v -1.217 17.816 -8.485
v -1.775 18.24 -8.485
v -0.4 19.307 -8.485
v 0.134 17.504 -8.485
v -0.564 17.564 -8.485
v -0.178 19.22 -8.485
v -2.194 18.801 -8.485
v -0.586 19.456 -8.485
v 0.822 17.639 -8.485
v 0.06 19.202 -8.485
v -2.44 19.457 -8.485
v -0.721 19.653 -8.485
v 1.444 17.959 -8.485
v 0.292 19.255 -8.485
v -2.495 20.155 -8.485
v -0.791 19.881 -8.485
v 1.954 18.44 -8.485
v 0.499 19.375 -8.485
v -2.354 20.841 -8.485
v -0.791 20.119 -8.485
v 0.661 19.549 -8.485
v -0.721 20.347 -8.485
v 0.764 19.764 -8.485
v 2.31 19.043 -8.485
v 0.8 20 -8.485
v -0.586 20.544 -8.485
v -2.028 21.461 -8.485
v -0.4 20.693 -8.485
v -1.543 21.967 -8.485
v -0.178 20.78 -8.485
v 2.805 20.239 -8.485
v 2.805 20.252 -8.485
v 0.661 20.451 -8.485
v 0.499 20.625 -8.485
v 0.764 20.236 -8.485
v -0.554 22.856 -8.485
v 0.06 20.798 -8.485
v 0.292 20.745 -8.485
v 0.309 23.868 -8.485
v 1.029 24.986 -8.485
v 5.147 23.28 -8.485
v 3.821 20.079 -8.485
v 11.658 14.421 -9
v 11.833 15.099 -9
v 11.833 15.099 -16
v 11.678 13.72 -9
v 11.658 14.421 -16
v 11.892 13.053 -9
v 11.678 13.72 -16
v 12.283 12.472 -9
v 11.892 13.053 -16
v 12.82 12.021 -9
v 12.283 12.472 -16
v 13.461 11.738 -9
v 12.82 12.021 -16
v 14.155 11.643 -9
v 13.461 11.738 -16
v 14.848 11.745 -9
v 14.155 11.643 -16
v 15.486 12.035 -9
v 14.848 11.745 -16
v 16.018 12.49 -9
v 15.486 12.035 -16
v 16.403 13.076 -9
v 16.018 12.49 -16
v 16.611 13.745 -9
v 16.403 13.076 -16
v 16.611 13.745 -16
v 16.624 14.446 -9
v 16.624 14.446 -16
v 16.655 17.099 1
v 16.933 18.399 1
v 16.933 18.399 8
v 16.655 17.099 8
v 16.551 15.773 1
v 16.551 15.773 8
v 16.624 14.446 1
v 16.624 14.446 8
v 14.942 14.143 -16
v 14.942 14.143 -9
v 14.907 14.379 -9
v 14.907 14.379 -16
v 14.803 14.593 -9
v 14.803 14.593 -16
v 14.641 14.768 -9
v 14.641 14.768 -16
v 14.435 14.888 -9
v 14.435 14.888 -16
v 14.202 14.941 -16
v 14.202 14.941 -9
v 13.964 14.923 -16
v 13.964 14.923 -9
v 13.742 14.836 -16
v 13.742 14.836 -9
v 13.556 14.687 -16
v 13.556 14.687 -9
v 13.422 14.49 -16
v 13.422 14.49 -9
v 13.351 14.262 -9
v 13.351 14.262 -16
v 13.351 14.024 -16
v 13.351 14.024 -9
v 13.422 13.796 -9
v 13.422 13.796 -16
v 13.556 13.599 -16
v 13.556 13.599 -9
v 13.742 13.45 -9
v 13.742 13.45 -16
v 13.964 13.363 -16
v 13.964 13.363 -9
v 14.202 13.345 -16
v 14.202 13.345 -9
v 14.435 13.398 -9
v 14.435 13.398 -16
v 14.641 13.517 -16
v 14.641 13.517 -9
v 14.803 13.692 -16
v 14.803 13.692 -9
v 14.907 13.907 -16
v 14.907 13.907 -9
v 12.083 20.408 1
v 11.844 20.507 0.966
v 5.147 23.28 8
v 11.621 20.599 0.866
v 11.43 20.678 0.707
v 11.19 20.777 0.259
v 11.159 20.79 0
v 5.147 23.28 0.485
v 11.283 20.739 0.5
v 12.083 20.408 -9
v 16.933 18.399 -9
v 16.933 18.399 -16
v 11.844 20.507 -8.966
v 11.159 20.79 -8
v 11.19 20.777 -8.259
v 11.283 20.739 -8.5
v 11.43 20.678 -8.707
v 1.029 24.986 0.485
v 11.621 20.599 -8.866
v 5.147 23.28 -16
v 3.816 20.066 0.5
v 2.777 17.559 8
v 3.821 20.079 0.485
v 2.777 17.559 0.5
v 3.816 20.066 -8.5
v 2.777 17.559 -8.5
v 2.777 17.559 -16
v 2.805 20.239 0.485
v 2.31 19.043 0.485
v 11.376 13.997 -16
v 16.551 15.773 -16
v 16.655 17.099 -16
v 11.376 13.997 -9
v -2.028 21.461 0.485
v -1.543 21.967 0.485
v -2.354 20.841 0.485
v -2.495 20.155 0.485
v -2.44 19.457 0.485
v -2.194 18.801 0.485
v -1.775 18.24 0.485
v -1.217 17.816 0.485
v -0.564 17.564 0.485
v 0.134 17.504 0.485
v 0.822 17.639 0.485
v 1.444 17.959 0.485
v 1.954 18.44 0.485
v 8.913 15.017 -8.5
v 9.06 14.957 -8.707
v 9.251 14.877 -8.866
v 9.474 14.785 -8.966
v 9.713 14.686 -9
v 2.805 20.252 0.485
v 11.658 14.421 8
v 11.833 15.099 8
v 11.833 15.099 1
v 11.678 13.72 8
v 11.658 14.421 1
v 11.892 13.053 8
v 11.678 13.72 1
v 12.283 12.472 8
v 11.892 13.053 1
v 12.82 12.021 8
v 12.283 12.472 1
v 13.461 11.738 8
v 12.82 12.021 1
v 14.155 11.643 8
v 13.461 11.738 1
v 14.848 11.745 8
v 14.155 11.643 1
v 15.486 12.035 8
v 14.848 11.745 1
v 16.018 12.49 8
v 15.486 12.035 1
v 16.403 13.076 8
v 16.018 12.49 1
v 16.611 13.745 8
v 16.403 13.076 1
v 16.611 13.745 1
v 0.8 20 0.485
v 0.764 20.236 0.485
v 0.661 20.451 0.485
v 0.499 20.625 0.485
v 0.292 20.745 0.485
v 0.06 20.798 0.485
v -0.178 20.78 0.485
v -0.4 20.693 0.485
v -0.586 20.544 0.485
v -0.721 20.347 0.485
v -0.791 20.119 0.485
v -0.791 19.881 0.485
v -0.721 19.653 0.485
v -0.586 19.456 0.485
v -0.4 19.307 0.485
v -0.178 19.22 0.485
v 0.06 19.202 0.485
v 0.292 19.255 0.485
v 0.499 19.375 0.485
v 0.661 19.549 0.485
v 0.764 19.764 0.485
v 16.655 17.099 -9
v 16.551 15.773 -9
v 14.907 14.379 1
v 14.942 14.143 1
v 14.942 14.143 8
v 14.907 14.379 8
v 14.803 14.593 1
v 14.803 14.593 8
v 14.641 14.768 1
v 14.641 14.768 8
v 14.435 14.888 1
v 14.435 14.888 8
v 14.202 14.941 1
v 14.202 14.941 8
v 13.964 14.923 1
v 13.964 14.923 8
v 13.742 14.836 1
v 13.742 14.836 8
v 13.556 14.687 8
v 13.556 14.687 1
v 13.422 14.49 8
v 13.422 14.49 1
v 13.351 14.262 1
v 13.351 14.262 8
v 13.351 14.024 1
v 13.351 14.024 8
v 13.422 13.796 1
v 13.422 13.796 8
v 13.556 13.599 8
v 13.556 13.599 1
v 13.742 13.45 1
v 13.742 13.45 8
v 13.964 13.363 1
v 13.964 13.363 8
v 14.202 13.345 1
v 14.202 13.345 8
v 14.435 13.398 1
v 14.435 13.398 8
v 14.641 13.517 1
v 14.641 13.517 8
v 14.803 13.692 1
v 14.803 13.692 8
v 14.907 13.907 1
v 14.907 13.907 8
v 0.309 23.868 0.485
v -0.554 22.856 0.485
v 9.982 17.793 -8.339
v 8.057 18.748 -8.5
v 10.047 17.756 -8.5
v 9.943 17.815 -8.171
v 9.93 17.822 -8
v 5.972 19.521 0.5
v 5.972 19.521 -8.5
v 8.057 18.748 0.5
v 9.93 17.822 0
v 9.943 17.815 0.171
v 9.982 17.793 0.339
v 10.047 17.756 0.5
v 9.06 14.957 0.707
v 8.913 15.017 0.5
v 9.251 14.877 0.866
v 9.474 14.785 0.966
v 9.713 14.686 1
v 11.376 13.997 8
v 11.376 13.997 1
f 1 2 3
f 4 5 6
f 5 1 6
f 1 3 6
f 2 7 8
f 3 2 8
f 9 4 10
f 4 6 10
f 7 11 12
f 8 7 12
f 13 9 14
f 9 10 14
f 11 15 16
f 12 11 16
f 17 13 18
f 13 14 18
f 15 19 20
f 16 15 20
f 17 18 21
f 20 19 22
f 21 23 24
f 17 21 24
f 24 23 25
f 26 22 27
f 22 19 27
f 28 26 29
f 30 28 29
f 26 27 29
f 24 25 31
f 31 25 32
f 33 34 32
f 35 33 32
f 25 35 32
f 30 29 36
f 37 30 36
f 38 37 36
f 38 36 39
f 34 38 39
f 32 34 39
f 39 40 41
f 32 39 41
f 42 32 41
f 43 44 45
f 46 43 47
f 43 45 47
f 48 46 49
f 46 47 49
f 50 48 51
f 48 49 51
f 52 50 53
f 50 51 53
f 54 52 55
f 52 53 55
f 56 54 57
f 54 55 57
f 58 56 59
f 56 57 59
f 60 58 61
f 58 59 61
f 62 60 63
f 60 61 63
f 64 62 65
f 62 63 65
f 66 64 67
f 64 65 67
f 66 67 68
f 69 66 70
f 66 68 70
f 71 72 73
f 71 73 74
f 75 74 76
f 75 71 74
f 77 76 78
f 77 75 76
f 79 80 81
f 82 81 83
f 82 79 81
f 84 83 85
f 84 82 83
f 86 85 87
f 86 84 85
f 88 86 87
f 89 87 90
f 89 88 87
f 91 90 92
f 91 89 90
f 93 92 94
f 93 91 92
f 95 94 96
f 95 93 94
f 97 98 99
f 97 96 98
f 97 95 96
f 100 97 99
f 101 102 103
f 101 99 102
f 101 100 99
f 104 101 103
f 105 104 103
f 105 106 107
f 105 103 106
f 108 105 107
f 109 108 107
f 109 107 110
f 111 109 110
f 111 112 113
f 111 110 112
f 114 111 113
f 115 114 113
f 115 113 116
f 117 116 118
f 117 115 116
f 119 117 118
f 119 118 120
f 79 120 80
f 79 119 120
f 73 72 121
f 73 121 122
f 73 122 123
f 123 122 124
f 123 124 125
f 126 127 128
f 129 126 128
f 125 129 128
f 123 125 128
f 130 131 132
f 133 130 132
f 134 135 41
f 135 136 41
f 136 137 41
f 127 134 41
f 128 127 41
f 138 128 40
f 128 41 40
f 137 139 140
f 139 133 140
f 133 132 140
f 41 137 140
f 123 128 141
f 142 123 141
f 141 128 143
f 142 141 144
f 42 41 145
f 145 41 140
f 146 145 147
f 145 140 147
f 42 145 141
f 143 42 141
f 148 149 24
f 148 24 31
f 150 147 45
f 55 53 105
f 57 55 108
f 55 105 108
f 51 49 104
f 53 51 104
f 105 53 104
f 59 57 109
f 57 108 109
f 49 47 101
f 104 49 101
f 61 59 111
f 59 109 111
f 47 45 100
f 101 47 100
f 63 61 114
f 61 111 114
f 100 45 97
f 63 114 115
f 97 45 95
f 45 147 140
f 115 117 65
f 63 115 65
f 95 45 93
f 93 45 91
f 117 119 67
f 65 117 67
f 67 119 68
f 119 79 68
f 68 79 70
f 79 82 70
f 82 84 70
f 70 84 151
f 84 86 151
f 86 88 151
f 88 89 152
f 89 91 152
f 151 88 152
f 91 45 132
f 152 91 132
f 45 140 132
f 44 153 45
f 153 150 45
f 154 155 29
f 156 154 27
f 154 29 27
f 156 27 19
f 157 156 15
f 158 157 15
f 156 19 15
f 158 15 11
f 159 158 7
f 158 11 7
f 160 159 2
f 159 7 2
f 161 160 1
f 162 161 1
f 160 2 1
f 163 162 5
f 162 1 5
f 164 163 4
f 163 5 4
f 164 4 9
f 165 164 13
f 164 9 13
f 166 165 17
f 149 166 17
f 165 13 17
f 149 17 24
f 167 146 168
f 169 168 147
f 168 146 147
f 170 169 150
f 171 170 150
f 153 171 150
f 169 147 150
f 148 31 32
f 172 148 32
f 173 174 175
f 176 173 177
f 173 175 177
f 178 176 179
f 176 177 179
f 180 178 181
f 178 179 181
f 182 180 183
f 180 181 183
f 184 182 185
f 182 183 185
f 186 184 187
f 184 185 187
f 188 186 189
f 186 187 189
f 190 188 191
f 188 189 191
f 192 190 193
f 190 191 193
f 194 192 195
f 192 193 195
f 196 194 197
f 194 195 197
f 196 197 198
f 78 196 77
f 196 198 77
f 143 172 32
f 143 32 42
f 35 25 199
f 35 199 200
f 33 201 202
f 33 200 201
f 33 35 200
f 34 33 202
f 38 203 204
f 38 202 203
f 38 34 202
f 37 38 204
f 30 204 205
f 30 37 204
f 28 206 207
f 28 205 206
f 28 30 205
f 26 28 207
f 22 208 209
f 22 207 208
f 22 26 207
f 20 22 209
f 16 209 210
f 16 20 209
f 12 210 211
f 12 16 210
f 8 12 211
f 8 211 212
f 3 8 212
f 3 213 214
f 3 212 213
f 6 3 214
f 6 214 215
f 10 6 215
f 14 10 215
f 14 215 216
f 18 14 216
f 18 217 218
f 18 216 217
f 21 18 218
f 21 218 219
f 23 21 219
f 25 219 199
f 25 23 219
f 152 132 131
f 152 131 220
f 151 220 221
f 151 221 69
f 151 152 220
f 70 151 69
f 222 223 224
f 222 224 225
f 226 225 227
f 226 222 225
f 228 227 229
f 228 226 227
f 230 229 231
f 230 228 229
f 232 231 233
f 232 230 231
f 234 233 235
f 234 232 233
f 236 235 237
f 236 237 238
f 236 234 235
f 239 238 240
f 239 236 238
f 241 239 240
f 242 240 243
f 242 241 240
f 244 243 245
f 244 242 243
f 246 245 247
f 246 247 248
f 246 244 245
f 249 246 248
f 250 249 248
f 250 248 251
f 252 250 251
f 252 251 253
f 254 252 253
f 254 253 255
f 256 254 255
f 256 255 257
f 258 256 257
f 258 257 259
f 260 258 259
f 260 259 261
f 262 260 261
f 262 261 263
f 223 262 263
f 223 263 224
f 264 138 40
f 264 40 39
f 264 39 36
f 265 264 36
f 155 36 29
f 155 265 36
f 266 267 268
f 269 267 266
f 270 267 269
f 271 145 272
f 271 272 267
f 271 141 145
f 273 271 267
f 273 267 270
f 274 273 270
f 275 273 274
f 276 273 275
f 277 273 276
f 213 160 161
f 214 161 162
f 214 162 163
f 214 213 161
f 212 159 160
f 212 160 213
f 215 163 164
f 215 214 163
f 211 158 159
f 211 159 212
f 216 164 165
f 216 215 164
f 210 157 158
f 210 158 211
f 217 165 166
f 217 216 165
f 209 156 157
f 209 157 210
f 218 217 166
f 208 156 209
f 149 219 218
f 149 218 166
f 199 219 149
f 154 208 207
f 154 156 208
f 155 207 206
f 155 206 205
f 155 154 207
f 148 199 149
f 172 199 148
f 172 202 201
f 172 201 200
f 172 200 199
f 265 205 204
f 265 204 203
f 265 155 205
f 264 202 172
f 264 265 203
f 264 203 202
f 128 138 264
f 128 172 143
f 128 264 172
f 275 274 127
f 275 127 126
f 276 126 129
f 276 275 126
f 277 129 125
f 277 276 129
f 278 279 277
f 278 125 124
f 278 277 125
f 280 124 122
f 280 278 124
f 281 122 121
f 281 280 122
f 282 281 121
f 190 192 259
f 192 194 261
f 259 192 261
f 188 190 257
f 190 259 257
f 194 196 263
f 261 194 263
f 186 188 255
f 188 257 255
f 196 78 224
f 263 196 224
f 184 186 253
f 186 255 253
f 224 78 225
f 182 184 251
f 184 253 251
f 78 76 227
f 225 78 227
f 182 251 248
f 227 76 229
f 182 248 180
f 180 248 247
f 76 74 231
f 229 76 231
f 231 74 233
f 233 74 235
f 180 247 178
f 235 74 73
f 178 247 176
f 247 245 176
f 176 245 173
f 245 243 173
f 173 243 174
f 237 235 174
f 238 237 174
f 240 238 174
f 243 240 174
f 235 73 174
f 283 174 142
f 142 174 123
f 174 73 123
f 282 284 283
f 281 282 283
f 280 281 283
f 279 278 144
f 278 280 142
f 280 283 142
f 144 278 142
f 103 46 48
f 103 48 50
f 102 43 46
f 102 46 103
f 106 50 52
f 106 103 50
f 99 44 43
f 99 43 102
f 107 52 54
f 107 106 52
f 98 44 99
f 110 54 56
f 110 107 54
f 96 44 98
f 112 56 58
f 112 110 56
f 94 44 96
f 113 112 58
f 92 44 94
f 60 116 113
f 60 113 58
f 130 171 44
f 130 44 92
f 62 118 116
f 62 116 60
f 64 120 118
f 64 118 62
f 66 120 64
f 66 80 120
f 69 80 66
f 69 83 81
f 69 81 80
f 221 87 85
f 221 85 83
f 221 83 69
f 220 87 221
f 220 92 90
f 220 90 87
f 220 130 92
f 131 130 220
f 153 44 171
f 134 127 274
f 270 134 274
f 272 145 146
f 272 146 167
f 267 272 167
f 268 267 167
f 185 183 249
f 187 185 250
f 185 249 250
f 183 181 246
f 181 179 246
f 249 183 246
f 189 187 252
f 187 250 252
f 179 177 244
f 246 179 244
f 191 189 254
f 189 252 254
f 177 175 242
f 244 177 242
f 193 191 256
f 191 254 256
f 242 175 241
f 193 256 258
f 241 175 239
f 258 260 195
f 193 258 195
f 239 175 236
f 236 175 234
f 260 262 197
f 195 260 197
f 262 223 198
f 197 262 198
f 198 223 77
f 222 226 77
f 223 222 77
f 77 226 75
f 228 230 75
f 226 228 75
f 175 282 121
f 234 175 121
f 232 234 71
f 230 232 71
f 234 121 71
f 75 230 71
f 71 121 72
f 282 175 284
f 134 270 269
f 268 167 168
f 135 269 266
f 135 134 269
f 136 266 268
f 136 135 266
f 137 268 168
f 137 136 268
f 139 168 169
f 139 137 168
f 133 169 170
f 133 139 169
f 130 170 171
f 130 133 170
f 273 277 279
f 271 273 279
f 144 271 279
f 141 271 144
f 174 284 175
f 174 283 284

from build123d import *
from OCP.BRepAlgoAPI import BRepAlgoAPI_Cut
from OCP.TopTools import TopTools_ListOfShape

# Parameters (mm, degrees)
SALIENTE_EXTRUIR1_DEPTH      = 8
SALIENTE_EXTRUIR1_DEPTH_BACK = 16
CROQUIS1_R                   = 0.8000000000000019
CROQUIS1_R_2                 = 0.8000000000000002
CROQUIS3_W                   = 5.999999999999999
CROQUIS3_H                   = 7.5149398575439825
CORTAR_EXTRUIR1_DEPTH        = 16
CROQUIS4_W                   = 12.500000000000004
CROQUIS4_H                   = 10.000000000000002
CORTAR_EXTRUIR2_DEPTH        = 16
REDONDEO1_R                  = 10
CORTAR_EXTRUIR3_DEPTH        = 39.561831595033986
SALIENTE_EXTRUIR2_START      = -7
SALIENTE_EXTRUIR2_DEPTH      = 7
SALIENTE_EXTRUIR3_START      = -7
SALIENTE_EXTRUIR3_DEPTH      = 7
CORTAR_EXTRUIR4_DEPTH        = 39.561831595033986
SALIENTE_EXTRUIR4_START      = 0.5
SALIENTE_EXTRUIR4_DEPTH      = 0.5
SALIENTE_EXTRUIR5_DEPTH      = 0.5
REDONDEO2_R                  = 1
SALIENTE_EXTRUIR6_DEPTH      = 7.5
SALIENTE_EXTRUIR7_DEPTH      = 7.5
CORTAR_EXTRUIR5_DEPTH        = 6.192871


with BuildPart() as part:
    # Croquis1 → Saliente-Extruir1 (new, two sides: drawn at the far end of the back side and taken through both)
    with BuildSketch(Plane.XY.offset(-SALIENTE_EXTRUIR1_DEPTH_BACK)):
        with BuildLine():
            Line((2.309746663820058, 19.04340690522453), (11.832681853129706, 15.099435825287522))
            ThreePointArc((11.832681853129735, 15.099435825287586), (14.633813116183077, 11.69161014757831), (15.904999780297969, 15.915790146996653))
            Line((15.904999780297969, 15.915790146996654), (16.93335681353175, 18.398814789031395))
            Line((16.93335681353175, 18.398814789031395), (1.029391105834504, 24.985521467228967))
            Line((1.029391105834504, 24.985521467228967), (0, 22.5))
            ThreePointArc((-2.2e-16, 22.5), (-2.078639306967261, 18.611022451034337), (2.3097466638200577, 19.04340690522453))
        make_face()
        with Locations((14.142428516949789, 14.142842730512115)):
            Circle(CROQUIS1_R, mode=Mode.SUBTRACT)
        with Locations((-8e-16, 20)):
            Circle(CROQUIS1_R_2, mode=Mode.SUBTRACT)
    extrude(amount=SALIENTE_EXTRUIR1_DEPTH + SALIENTE_EXTRUIR1_DEPTH_BACK)

    # Croquis3 → Cortar-Extruir1 (cut)
    with BuildSketch(Plane(origin=(8.98354685928157, 21.691268210929703, 0), x_dir=(0.9238986655280315, -0.38263723791016835, 0), z_dir=(0.38263723791016835, 0.9238986655280315, 0))):
        Polygon((-10.15274475820337, -8), (-4.152744758203371, -8), (-4.152744758203371, -0.4850601424560169), (-10.15274475820337, -0.48506014245601775), align=None)
        with Locations((-7.1527447582033705, 12.242530071228009)):
            Rectangle(CROQUIS3_W, CROQUIS3_H)
    extrude(amount=-CORTAR_EXTRUIR1_DEPTH, mode=Mode.SUBTRACT)

    # Croquis4 → Cortar-Extruir2 (cut)
    with BuildSketch(Plane(origin=(8.98354685928157, 21.691268210929703, 0), x_dir=(0.9238986655280315, -0.38263723791016835, 0), z_dir=(0.38263723791016835, 0.9238986655280315, 0))):
        with Locations((8.604634091236255, 4.000000000000001)):
            Rectangle(CROQUIS4_W, CROQUIS4_H)
    extrude(amount=-CORTAR_EXTRUIR2_DEPTH, mode=Mode.SUBTRACT)

    # Redondeo1
    # the kernel refuses this fillet: 10 mm, written as the material it adds along each edge
    with BuildSketch(Plane(origin=(15.90499978029797, 15.915790146996653, 1), x_dir=(0.43937810664982085, -0.898302220523148, 0), z_dir=(0, 0, 1))) as redondeo1_piece_1:
        with BuildLine():
            CenterArc((4.909244259441116, 9.449263834962537), REDONDEO1_R, 228.0261529616087, 22.86990266701423)
            Line((-1.7786689833312208, 2.0147620724265707), (-1.9124272481866686, 1.8660720371758521))
            ThreePointArc((-1.9124272481866686, 1.8660720371758521), (-1.0392674370387214, 0.8750174766821813), (-0.14993294537311094, -0.13236355953110399))
            Line((-0.14993294537311094, -0.13236355953110399), (0.06545659012588191, -0.18898527669924975))
            ThreePointArc((0.06545659012588191, -0.18898527669924975), (0.8182073765735266, -0.06231595874062915), (1.5709581630211649, -0.18898527669925216))
            Line((1.5709581630211649, -0.18898527669925216), (1.636414753147047, 6e-17))
        make_face()
    extrude(amount=7)
    with BuildSketch(Plane(origin=(15.90499978029797, 15.915790146996653, -16), x_dir=(0.43937810664982085, -0.898302220523148, 0), z_dir=(0, 0, 1))) as redondeo1_piece_2:
        with BuildLine():
            CenterArc((4.909244259441116, 9.449263834962537), REDONDEO1_R, 228.0261529616087, 22.86990266701423)
            Line((-1.7786689833312208, 2.0147620724265707), (-1.9124272481866686, 1.8660720371758521))
            ThreePointArc((-1.9124272481866686, 1.8660720371758521), (-1.0392674370387214, 0.8750174766821813), (-0.14993294537311094, -0.13236355953110399))
            Line((-0.14993294537311094, -0.13236355953110399), (0.06545659012588191, -0.18898527669924975))
            ThreePointArc((0.06545659012588191, -0.18898527669924975), (0.8182073765735266, -0.06231595874062915), (1.5709581630211649, -0.18898527669925216))
            Line((1.5709581630211649, -0.18898527669925216), (1.636414753147047, 6e-17))
        make_face()
    extrude(amount=6.999999999999998)
    with BuildSketch(Plane(origin=(-1.1e-16, 22.5, 0.4850601424560175), x_dir=(-0.9451707970750715, -0.3265764295788571, 0), z_dir=(0, 0, -1))) as redondeo1_piece_3:
        with BuildLine():
            CenterArc((4.898646443682852, 9.451707970750716), REDONDEO1_R, 228.06162230808002, 22.877267808488114)
            Line((-1.784663138412825, 2.0130674343443404), (-1.9183293300547388, 1.8642946236162135))
            ThreePointArc((-1.9183293300547388, 1.8642946236162135), (-1.0419879162330352, 0.8738575030467765), (-0.149656347026621, -0.13267621412539496))
            Line((-0.149656347026621, -0.13267621412539496), (0.06531528591577111, -0.18903415941501364))
            ThreePointArc((0.06531528591577111, -0.18903415941501364), (0.8164410739471419, -0.06292699268767933), (1.5675668619785121, -0.1890341594150131))
            Line((1.5675668619785121, -0.1890341594150131), (1.6328821478942839, -5e-17))
        make_face()
    extrude(amount=8.970120284912035)

    # Croquis5 → Cortar-Extruir3 (cut, through all)
    with BuildSketch(Plane.XY.offset(8)):
        with BuildLine():
            Line((2.309746663820078, 19.04340690522458), (2.8048354948987004, 20.238826130100847))
            ThreePointArc((2.8048354948987004, 20.238826130100847), (7.811221113299703, 18.852662916127482), (12.314929423667346, 16.26384911999791))
            Line((12.314929423667346, 16.26384911999791), (11.83268185312971, 15.099435825287534))
            Line((11.83268185312971, 15.099435825287534), (2.309746663820078, 19.04340690522458))
        make_face()
    extrude(amount=-CORTAR_EXTRUIR3_DEPTH, mode=Mode.SUBTRACT)

    # Croquis7 → Saliente-Extruir2 (add)
    with BuildSketch(Plane(origin=(0, 0, -16), x_dir=(-1, 0, 0), z_dir=(0, 0, -1)).offset(SALIENTE_EXTRUIR2_START)):
        with BuildLine():
            Line((-12.314929423667346, 16.26384911999791), (-11.83268185312971, 15.099435825287534))
            Line((-11.83268185312971, 15.099435825287534), (-2.309746663820078, 19.04340690522458))
            Line((-2.309746663820078, 19.04340690522458), (-2.8048354948986987, 20.238826130100847))
            ThreePointArc((-2.8048354948986987, 20.238826130100847), (-7.811221113299688, 18.852662916127446), (-12.314929423667346, 16.26384911999791))
        make_face()
    extrude(amount=SALIENTE_EXTRUIR2_DEPTH)

    # Croquis8 → Saliente-Extruir3 (add)
    with BuildSketch(Plane.XY.offset(8).offset(SALIENTE_EXTRUIR3_START)):
        with BuildLine():
            Line((11.83268185312971, 15.099435825287534), (12.314929423667346, 16.26384911999791))
            ThreePointArc((12.314929423667346, 16.26384911999791), (11.149114957675053, 17.083977118308297), (9.929630744917306, 17.821941587347368))
            ThreePointArc((9.929630744917306, 17.821941587347368), (6.961487524857346, 19.186020427437004), (3.815730334224168, 20.066245940784494))
            ThreePointArc((3.815730334224168, 20.066245940784494), (3.311351692275589, 20.158796440416758), (2.8048354948986964, 20.238826130100843))
            Line((2.8048354948986964, 20.238826130100843), (2.309746663820078, 19.04340690522458))
            Line((2.309746663820078, 19.04340690522458), (11.83268185312971, 15.099435825287534))
        make_face()
    extrude(amount=SALIENTE_EXTRUIR3_DEPTH)

    # Croquis9 → Cortar-Extruir4 (cut, through all)
    with BuildSketch(Plane(origin=(0, 0, -16), x_dir=(-1, 0, 0), z_dir=(0, 0, -1))):
        Polygon((-3.815730334224168, 20.066245940784487), (-3.233645329348107, 18.66076966731441), (-2.309746663820078, 19.04340690522458), (-2.8048354948986987, 20.238826130100847), (-2.8048354948987475, 20.252229554385092), (-3.8209148592802196, 20.078764261810548), align=None)
    extrude(amount=-CORTAR_EXTRUIR4_DEPTH, mode=Mode.SUBTRACT)

    # Croquis10 → Saliente-Extruir4 (add)
    with BuildSketch(Plane.XY.offset(-9.000000000000002).offset(SALIENTE_EXTRUIR4_START)):
        with BuildLine():
            Line((3.233645329348107, 18.66076966731441), (3.8157303342241673, 20.06624594078449))
            ThreePointArc((3.8157303342241673, 20.06624594078449), (6.961487524857336, 19.186020427436976), (9.929630744917306, 17.821941587347368))
            Line((9.929630744917306, 17.821941587347368), (9.24580396443071, 16.170804198329783))
            Line((9.24580396443071, 16.170804198329783), (3.233645329348107, 18.66076966731441))
        make_face()
    extrude(amount=-SALIENTE_EXTRUIR4_DEPTH)

    # Croquis11 → Saliente-Extruir5 (add)
    with BuildSketch(Plane(origin=(0, 0, 1), x_dir=(-1, 0, 0), z_dir=(0, 0, -1))):
        with BuildLine():
            Line((-9.929630744917324, 17.8219415873474), (-9.245803964430717, 16.170804198329783))
            Line((-9.245803964430717, 16.170804198329783), (-3.233645329348109, 18.66076966731441))
            Line((-3.233645329348109, 18.66076966731441), (-3.815730334224181, 20.066245940784526))
            ThreePointArc((-3.815730334224181, 20.066245940784526), (-6.9614875248573655, 19.18602042743705), (-9.929630744917324, 17.8219415873474))
        make_face()
    extrude(amount=SALIENTE_EXTRUIR5_DEPTH)

    # Redondeo2
    redondeo2_edges = [part.edges().sort_by_distance(p)[0] for p in [
        (10.202397059206133, 18.48055086214986, -9.000000000000002),
        (10.202397059206136, 18.48055086214986, 1),
    ]]
    fillet(redondeo2_edges, radius=REDONDEO2_R)

    # Croquis12 → Saliente-Extruir6 (add)
    with BuildSketch(Plane.XY.offset(8)):
        Polygon((11.83268185312971, 15.099435825287534), (11.436504054366878, 14.142842730512099), (11.37624481953794, 13.997343492256391), (2.7772082957563384, 17.558677334283267), (3.233645329348107, 18.66076966731441), align=None)
    extrude(amount=-SALIENTE_EXTRUIR6_DEPTH)

    # Croquis13 → Saliente-Extruir7 (add)
    with BuildSketch(Plane(origin=(0, 0, -16), x_dir=(-1, 0, 0), z_dir=(0, 0, -1))):
        Polygon((-3.233645329348117, 18.660769667314405), (-2.7772082957563384, 17.558677334283267), (-11.37624481953794, 13.997343492256391), (-11.83268185312971, 15.099435825287534), align=None)
    extrude(amount=-SALIENTE_EXTRUIR7_DEPTH)


with BuildPart() as cortar_extruir5_tool:
    # Croquis15 → Cortar-Extruir5 (new body)
    with BuildSketch(Plane(origin=(8.98354685928157, 21.691268210929703, 0), x_dir=(0.9238986655280315, -0.38263723791016835, 0), z_dir=(0.38263723791016835, 0.9238986655280315, 0))):
        with BuildLine():
            Line((8.604634091236257, 9.000000000000002), (8.604634091236257, -1))
            Line((8.604634091236257, -1), (3.3546340912362544, -1))
            ThreePointArc((3.3546340912362544, -1), (2.6475273100497065, -0.7071067811865478), (2.354634091236254, 1.2e-16))
            Line((2.354634091236254, 1.2e-16), (2.354634091236254, 8))
            ThreePointArc((2.354634091236254, 8), (2.6475273100497057, 8.70710678118655), (3.3546340912362544, 9.000000000000002))
            Line((3.3546340912362544, 9.000000000000002), (8.604634091236257, 9.000000000000002))
        make_face()
    extrude(amount=-CORTAR_EXTRUIR5_DEPTH)


with BuildPart() as part_1:
    add(part.part)

    # Cortar-Extruir5: cut by cortar_extruir5_tool, with a tolerance
    cortar_extruir5_stock = TopTools_ListOfShape()
    cortar_extruir5_stock.Append(part_1.part.wrapped)
    cortar_extruir5_tools = TopTools_ListOfShape()
    cortar_extruir5_tools.Append(cortar_extruir5_tool.part.wrapped)
    cortar_extruir5_cut = BRepAlgoAPI_Cut()
    cortar_extruir5_cut.SetArguments(cortar_extruir5_stock)
    cortar_extruir5_cut.SetTools(cortar_extruir5_tools)
    cortar_extruir5_cut.SetFuzzyValue(0.00001)
    cortar_extruir5_cut.Build()
    add(Compound.cast(cortar_extruir5_cut.Shape()).solids(), mode=Mode.REPLACE)


solid = part_1.part
